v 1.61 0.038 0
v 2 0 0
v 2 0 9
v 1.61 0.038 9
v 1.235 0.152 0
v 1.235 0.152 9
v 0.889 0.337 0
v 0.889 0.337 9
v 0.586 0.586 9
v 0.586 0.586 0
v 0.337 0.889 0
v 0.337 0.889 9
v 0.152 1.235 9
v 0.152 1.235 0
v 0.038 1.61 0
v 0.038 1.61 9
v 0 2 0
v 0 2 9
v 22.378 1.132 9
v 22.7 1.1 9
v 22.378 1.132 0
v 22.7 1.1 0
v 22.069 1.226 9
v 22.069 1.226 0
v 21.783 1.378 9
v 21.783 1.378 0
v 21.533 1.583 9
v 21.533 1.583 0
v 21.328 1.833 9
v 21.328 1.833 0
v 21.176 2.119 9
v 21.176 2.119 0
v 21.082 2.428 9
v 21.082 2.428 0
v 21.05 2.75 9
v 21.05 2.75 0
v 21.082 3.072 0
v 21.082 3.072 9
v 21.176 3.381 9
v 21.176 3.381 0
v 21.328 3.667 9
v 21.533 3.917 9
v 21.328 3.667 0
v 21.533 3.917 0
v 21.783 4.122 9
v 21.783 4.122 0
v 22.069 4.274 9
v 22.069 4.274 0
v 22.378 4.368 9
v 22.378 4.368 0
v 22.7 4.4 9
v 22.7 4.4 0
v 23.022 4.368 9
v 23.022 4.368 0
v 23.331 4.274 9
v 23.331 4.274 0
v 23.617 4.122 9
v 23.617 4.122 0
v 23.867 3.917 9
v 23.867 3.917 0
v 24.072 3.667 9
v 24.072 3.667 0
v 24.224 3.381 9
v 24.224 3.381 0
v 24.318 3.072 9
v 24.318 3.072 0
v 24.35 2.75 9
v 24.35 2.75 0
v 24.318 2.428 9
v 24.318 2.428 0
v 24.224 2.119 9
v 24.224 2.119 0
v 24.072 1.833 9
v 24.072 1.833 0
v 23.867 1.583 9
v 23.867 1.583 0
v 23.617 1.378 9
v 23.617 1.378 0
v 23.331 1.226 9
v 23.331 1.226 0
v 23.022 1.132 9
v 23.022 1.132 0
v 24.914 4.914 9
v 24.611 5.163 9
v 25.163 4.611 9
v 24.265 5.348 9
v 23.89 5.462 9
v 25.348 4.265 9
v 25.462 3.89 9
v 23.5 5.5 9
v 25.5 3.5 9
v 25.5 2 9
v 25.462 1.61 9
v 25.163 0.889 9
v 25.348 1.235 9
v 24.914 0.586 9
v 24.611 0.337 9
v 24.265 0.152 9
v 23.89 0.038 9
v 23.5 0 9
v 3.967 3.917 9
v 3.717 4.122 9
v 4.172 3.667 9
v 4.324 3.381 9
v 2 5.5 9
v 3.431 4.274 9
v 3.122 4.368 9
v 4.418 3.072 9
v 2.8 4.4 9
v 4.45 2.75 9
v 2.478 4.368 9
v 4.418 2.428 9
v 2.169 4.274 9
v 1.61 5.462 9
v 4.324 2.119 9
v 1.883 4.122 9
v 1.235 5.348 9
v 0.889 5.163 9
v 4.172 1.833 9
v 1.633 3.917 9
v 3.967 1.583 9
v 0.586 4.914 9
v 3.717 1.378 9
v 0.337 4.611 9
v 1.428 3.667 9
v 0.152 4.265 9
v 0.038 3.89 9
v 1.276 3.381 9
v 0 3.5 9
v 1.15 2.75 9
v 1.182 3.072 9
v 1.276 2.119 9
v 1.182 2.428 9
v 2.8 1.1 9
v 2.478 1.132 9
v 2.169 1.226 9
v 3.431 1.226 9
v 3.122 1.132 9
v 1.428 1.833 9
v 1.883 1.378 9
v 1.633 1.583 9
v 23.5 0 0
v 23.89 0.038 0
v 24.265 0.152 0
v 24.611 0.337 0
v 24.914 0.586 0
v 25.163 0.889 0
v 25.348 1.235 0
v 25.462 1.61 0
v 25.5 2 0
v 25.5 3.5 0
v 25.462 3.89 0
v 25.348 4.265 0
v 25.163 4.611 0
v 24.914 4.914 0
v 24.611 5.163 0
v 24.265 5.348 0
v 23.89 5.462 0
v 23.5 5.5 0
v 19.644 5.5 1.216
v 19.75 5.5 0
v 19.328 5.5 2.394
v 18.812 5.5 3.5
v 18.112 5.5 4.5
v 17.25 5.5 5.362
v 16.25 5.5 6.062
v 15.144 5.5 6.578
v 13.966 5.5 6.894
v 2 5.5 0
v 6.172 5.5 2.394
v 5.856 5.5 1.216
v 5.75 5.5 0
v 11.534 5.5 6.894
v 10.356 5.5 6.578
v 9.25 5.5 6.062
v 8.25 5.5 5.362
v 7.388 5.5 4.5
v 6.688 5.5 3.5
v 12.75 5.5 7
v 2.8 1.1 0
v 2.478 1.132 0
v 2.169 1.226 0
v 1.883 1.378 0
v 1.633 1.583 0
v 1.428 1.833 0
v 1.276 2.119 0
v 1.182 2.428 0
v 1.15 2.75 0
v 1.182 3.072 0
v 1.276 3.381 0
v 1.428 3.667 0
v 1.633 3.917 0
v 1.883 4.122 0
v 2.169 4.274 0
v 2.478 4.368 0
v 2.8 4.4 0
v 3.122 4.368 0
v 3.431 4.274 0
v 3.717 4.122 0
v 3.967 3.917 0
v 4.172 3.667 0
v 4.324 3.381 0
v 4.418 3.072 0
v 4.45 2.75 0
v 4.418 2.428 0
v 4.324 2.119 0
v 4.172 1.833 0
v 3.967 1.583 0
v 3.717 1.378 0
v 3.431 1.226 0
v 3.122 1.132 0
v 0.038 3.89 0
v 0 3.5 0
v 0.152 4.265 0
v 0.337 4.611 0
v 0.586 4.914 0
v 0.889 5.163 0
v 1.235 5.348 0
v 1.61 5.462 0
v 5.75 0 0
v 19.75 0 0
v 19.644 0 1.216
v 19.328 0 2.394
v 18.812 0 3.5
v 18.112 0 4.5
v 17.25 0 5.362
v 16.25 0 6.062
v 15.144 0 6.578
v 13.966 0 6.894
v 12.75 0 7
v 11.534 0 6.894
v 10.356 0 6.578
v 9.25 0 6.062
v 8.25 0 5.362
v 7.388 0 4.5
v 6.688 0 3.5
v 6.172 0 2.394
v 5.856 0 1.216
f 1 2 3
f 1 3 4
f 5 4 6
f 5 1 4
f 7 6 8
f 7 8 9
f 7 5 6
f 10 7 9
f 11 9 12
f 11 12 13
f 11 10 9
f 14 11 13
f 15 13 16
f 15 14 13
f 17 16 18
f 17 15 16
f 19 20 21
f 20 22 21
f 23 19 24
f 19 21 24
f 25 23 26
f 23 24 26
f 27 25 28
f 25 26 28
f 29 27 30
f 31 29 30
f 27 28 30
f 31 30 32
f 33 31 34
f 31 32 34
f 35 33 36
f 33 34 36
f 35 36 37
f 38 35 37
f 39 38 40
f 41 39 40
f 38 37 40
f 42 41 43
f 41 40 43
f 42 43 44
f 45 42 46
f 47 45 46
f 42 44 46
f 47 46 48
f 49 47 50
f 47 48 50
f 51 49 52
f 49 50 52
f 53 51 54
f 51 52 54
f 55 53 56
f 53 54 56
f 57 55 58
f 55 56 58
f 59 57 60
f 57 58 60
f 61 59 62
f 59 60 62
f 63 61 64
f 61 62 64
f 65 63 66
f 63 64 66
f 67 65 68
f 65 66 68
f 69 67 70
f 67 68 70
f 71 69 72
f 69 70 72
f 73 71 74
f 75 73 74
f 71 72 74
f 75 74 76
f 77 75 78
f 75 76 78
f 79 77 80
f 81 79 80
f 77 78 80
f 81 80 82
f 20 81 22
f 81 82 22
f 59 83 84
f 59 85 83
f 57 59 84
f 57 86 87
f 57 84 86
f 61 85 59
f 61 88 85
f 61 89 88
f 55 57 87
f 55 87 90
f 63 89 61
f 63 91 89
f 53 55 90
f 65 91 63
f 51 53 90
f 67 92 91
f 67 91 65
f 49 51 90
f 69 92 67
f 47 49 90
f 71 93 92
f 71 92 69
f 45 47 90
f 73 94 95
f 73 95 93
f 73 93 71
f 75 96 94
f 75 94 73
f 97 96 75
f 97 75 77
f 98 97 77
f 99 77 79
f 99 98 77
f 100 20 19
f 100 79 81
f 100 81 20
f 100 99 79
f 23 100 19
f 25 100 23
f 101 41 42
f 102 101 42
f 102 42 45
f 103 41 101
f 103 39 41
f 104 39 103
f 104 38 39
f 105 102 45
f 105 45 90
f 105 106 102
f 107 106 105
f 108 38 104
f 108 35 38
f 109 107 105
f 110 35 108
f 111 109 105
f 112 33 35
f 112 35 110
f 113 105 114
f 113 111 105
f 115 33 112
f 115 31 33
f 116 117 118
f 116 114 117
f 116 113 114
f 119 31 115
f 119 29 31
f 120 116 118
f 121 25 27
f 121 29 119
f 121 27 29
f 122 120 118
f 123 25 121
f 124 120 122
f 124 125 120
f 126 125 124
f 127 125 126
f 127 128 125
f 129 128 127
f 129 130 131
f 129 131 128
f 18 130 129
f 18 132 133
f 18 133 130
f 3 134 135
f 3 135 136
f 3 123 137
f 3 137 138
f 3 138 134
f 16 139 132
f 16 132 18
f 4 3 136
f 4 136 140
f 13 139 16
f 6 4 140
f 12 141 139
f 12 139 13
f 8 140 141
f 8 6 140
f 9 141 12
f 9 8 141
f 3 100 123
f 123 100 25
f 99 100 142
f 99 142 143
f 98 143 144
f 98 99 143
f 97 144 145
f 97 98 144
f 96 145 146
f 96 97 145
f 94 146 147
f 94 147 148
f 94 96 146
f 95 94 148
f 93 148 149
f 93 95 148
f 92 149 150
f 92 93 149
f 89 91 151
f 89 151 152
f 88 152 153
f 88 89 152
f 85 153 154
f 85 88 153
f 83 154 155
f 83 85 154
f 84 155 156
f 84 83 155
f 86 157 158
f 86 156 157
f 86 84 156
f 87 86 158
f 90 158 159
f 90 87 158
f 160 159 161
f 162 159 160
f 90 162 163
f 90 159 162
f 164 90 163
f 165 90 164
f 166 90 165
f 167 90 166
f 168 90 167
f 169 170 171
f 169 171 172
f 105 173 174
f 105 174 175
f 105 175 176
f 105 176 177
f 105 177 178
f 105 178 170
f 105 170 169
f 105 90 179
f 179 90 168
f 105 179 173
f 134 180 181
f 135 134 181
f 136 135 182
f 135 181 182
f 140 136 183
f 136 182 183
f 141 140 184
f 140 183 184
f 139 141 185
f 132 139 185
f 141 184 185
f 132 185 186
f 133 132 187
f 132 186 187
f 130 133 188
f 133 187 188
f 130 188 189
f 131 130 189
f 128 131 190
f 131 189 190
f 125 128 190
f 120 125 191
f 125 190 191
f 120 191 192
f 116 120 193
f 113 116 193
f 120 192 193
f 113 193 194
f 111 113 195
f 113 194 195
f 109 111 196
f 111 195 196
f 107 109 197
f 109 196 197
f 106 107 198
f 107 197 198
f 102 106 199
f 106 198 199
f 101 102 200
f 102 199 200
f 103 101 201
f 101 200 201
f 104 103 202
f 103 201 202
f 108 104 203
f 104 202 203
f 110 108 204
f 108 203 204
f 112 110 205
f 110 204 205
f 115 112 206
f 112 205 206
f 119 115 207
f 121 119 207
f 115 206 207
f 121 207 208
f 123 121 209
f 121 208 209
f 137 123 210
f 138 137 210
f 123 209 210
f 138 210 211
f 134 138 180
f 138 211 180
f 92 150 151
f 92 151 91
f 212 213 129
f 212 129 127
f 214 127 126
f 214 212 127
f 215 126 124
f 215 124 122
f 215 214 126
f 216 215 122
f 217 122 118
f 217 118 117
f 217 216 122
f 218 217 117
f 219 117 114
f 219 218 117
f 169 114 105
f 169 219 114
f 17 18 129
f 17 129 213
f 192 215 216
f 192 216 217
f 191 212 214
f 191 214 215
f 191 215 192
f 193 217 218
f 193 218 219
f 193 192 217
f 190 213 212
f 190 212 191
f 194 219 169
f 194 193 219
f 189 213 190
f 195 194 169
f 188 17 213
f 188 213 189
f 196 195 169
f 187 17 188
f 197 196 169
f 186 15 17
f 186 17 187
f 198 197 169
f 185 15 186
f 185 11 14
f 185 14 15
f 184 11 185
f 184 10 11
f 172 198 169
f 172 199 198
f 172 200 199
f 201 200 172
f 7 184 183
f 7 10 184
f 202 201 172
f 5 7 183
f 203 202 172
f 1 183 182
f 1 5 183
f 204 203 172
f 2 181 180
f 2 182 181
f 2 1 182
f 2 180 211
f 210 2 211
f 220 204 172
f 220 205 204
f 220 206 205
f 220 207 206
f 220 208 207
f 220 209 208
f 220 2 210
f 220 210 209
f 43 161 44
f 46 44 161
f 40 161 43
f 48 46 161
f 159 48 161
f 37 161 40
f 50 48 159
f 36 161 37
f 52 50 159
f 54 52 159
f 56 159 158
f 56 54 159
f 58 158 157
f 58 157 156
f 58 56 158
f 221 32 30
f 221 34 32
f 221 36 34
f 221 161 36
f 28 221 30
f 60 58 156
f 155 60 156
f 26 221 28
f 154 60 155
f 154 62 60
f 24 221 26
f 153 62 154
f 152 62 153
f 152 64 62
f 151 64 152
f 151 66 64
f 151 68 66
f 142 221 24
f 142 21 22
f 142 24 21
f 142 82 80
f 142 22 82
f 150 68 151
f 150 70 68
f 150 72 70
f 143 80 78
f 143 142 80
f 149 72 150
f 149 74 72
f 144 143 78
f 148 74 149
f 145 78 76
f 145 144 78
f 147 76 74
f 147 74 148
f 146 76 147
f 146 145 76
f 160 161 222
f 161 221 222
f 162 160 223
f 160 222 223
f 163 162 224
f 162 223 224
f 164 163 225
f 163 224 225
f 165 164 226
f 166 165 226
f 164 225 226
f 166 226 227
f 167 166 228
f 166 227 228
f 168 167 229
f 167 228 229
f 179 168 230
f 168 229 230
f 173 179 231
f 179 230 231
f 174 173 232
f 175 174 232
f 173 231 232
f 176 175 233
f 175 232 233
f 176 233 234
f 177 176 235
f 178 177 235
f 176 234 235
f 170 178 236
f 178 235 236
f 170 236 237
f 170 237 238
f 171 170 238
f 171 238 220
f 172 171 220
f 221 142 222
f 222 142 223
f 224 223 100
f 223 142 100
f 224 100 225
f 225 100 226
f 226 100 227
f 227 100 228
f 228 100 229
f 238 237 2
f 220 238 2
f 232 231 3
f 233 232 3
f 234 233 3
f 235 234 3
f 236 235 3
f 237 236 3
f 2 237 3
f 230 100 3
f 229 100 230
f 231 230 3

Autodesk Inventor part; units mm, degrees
ref_plane "YZ Plane" through (0, 0, 0) normal (1, 0, 0) x (0, 1, 0)
ref_plane "XZ Plane" through (0, 0, 0) normal (0, 1, 0) x (-1, 0, 0)
ref_plane "XY Plane" through (0, 0, 0) normal (0, 0, 1) x (1, 0, 0)
sketch "Skizze1" plane through (0, 0, 0) normal (0, 1, 0) x (-1, 0, 0)
  line L0 (0, 0) -> (-25.5, 0)
  line L1 (-25.5, 0) -> (-25.5, 9)
  line L2 (-25.5, 9) -> (0, 9)
  line L3 (0, 9) -> (0, 0)
  dimension "d0" = 25.5
  dimension "d1" = 9
extrude "Extrusion1" add sketch "Skizze1" along normal blind 5.5
sketch "Skizze2" plane through (0, 0, 0) normal (0, -1, 0) x (1, 0, 0)
  line L0 (25.5, 0) -> (0, 0) projected
  arc A0 (19.75, 0) -> (5.75, 0) centre (12.75, 0) ccw
  dimension "d4" = 14
extrude "Extrusion2" cut sketch "Skizze2" against normal through all
sketch "Skizze5" plane through (0, 0, 9) normal (0, 0, 1) x (1, 0, 0)
  line L0 (0, 0) -> (0, 5.5) construction
  line L1 (0, 2.75) -> (25.5934, 2.75) construction
  line L2 (25.5, 0) -> (0, 0) construction
  line L3 (12.75, 0) -> (12.75, 5.5) construction
  line L4 (0, 5.5) -> (25.5, 5.5) construction
  point P0 (2.8, 2.75)
  point P1 (22.7, 2.75)
  dimension "d33" = 2.8
hole "Bohrung4" at (2.8, 2.75, 9) at (22.7, 2.75, 9) direction (0, 0, -1) diameter 3.3 end through all
fillet "Rundung1" radius 2 4 edges at (25.5, 0, 4.5) (25.5, 5.5, 4.5) (0, 0, 4.5) (0, 5.5, 4.5)
properties part number "Wellenhalterung_oben" material "ABS-Kunststoff"
